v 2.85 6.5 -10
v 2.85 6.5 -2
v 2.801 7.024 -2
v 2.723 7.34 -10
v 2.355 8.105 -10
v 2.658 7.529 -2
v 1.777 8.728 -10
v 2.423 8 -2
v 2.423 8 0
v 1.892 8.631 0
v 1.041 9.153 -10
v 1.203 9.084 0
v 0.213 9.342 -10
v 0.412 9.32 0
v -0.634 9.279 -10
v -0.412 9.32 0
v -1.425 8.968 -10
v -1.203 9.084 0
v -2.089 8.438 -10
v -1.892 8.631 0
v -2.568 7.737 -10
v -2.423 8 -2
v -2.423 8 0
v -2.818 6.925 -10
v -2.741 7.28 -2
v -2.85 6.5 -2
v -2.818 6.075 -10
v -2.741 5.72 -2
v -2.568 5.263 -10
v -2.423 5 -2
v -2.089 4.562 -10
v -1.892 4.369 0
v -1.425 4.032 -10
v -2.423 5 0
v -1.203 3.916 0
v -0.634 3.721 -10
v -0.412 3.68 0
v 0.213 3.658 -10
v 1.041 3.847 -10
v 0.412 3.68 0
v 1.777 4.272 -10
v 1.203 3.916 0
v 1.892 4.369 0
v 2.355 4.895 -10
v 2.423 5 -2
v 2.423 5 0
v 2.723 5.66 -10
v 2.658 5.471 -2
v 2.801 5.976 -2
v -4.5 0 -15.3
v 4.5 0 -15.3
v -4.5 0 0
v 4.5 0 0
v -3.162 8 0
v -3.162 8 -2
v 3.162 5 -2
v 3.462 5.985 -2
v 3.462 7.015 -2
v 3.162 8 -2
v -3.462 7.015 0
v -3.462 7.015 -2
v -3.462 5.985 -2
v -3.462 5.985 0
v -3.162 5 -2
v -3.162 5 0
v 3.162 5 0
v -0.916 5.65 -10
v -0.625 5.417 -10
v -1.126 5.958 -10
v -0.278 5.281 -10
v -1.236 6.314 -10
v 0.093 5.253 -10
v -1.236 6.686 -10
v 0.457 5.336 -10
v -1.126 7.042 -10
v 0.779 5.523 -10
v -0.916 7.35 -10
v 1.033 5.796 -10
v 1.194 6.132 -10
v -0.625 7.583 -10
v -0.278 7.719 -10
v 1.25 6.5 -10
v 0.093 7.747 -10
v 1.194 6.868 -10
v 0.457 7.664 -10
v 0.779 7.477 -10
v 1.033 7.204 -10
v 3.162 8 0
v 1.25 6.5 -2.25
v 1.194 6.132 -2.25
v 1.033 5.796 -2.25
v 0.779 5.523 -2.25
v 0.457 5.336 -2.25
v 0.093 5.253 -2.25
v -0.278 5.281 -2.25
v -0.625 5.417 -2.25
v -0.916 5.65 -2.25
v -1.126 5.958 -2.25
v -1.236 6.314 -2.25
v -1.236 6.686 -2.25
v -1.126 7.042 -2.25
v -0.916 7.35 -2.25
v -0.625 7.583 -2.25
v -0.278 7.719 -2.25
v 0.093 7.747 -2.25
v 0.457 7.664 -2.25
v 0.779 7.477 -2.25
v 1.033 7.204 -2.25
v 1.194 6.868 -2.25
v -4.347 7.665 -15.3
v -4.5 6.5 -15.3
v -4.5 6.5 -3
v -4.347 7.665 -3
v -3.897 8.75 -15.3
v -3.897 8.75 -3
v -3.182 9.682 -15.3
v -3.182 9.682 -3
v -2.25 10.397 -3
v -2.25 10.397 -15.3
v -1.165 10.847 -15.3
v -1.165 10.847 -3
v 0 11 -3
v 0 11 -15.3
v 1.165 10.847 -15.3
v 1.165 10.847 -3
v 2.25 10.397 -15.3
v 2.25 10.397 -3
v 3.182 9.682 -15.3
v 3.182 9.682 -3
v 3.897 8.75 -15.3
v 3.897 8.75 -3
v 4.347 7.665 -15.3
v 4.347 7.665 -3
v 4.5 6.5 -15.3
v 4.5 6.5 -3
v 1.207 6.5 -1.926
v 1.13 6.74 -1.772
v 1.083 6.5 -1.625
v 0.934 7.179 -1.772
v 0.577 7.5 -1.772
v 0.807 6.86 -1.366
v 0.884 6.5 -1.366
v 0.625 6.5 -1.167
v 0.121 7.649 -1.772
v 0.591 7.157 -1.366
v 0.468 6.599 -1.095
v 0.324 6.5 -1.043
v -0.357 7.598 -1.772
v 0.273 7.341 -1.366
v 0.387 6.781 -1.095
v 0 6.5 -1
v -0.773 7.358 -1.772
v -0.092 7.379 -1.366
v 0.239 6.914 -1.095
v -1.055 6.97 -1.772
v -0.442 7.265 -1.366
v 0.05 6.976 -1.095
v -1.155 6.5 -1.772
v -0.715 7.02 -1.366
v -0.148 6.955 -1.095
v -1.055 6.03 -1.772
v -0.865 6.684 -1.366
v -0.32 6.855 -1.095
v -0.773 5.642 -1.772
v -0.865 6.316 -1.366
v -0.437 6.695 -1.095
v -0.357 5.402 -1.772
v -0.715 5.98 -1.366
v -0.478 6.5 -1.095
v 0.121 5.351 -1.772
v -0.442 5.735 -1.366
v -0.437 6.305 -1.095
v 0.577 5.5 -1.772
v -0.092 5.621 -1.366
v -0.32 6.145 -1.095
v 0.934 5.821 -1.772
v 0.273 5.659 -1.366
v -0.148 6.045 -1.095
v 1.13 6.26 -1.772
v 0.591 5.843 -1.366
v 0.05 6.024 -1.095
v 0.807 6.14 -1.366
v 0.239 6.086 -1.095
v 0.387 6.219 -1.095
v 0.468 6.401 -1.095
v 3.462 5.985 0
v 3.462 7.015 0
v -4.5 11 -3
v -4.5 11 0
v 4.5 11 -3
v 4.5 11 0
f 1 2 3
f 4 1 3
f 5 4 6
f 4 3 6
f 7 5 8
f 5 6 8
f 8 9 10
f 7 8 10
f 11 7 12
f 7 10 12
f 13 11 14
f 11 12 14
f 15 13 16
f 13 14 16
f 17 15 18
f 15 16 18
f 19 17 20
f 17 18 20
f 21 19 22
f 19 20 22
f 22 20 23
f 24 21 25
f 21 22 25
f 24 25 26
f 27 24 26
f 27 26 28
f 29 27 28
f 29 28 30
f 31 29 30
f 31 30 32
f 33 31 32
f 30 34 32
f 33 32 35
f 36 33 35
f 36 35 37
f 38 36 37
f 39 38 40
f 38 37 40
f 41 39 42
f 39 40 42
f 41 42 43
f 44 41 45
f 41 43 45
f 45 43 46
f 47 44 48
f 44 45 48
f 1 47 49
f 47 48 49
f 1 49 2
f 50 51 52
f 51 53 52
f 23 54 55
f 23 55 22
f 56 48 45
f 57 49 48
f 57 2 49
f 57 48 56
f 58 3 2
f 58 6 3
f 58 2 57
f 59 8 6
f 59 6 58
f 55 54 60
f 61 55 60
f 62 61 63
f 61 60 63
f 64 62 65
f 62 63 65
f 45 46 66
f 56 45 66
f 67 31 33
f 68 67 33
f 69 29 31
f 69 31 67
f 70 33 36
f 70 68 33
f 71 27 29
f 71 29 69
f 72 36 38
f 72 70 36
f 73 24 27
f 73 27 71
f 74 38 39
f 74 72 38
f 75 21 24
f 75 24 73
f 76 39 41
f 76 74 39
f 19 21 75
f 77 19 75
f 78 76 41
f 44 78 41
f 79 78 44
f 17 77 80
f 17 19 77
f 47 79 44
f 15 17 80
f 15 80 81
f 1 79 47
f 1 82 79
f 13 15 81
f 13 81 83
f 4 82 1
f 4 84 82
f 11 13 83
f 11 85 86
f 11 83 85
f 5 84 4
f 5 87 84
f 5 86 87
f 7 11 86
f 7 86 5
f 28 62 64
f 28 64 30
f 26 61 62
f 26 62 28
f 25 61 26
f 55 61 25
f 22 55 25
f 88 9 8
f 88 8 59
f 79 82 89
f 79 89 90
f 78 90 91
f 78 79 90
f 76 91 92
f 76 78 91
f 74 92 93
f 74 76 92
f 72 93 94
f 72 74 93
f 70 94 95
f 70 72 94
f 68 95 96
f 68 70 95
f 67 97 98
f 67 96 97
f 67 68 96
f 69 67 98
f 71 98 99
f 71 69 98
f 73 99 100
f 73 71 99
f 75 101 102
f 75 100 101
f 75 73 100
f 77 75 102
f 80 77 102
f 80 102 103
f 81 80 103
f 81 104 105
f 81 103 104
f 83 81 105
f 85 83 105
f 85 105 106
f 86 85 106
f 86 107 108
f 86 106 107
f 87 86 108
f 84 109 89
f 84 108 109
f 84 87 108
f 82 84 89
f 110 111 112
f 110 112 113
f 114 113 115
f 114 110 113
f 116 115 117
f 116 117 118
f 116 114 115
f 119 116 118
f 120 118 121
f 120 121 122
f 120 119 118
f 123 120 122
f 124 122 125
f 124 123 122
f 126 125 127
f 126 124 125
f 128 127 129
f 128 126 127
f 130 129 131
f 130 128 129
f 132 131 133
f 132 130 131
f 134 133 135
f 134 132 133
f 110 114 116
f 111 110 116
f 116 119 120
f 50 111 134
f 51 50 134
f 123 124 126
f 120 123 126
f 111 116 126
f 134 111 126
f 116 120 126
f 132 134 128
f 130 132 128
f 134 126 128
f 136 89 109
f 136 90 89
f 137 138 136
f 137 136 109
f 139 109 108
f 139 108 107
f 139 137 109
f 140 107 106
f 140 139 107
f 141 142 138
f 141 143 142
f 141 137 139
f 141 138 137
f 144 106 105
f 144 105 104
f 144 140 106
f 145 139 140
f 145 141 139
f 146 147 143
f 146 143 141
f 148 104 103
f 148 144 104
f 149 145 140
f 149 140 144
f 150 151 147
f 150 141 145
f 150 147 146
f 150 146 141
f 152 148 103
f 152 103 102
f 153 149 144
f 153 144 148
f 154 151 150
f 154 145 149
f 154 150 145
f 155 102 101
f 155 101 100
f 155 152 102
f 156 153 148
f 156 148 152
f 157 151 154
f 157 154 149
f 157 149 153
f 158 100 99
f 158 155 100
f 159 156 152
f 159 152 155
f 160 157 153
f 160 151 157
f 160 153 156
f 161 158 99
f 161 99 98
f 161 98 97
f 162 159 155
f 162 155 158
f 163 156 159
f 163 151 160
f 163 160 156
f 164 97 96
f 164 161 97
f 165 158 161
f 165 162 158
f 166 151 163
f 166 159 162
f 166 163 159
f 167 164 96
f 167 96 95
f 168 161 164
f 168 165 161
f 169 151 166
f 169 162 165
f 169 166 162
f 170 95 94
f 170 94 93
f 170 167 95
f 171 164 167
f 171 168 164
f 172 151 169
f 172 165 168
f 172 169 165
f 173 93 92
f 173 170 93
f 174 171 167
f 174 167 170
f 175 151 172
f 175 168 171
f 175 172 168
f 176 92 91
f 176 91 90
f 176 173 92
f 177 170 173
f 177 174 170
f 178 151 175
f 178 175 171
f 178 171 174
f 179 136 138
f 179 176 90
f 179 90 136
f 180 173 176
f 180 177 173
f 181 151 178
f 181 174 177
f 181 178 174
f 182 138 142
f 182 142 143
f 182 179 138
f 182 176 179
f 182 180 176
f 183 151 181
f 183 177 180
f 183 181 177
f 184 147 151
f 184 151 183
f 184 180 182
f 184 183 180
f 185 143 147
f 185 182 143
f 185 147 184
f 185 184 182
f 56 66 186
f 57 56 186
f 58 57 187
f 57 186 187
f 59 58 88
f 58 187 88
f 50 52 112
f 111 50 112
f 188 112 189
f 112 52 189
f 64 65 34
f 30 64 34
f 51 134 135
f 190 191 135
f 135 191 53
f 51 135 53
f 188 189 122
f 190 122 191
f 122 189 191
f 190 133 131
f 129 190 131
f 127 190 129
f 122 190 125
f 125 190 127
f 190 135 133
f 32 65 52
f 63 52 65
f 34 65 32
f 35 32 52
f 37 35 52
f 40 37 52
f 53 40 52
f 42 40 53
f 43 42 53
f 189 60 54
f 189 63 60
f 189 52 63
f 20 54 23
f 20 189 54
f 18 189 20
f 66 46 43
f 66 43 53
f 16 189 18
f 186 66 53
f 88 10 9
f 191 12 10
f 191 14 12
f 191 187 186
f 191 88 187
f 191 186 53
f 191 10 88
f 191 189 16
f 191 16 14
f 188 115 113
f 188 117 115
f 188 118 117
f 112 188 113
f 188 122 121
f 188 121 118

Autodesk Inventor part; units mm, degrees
ref_plane "YZ Plane" through (0, 0, 0) normal (1, 0, 0) x (0, 1, 0)
ref_plane "XZ Plane" through (0, 0, 0) normal (0, 1, 0) x (-1, 0, 0)
ref_plane "XY Plane" through (0, 0, 0) normal (0, 0, 1) x (1, 0, 0)
sketch "Sketch1" plane through (0, 0, 0) normal (0, 0, 1) x (1, 0, 0)
  line L0 (-4.5, 11) -> (4.5, 11)
  line L1 (4.5, 11) -> (4.5, 0)
  line L2 (4.5, 0) -> (-4.5, 0)
  line L3 (-4.5, 0) -> (-4.5, 11)
  point P0 (0, 0)
  dimension "d0" = 9
  dimension "d1" = 0
  dimension "d2" = 11
  dimension "d3" = 4.5
extrude "Extrusion1" add sketch "Sketch1" against normal blind 15.3
sketch "Sketch2" plane through (0, 0, 0) normal (0, 0, 1) x (1, 0, 0)
  line L0 (4.5, 0) -> (-4.5, 0) projected
  circle A0 centre (0, 6.5) radius 2.85
  point P0 (0, 0)
  dimension "d6" = 5.7
  dimension "d7" = 6.5
extrude "Extrusion2" cut sketch "Sketch2" against normal blind 10
sketch "Sketch4" plane through (0, 0, 0) normal (0, 0, 1) x (1, 0, 0)
  circle A0 centre (0, 6.5) radius 2.85 projected
  line L0 (4.5, 11) -> (4.5, 0) projected
  arc A1 (-3.1623, 8) -> (-3.1623, 5) centre (0, 6.5) ccw
  arc A2 (3.1623, 5) -> (3.1623, 8) centre (0, 6.5) ccw
  line L1 (-3.1623, 8) -> (3.1623, 8)
  line L2 (-3.1623, 5) -> (3.1623, 5)
  point P0 (0, 0)
  dimension "d17" = 3.5
  dimension "d18" = 3
  dimension "d19" = 1.5
extrude "Extrusion4" cut sketch "Sketch4" against normal blind 2 contours A0 L2 L1 | A0 L1 A2 L2 | A0 L2 A1 L1
sketch "Sketch3" plane through (0, 6.5, -10) normal (0, 0, 1) x (1, 0, 0)
  circle A0 centre (0, 0) radius 2.85 projected
  circle A1 centre (0, 0) radius 1.25
  point P0 (0, -6.5)
  dimension "d10" = 2.5
extrude "Extrusion3" add sketch "Sketch3" along normal blind 9 contours A1
fillet "Fillet1" radius 1.25 1 edges at (-1.25, 6.5, -1)
sketch "Sketch5" plane through (0, 0, -15.3) normal (0, 0, -1) x (-1, 0, 0)
  line L0 (4.5, 11) -> (-4.5, 11) projected
  line L1 (-4.5, 11) -> (-4.5, 0) projected
  line L2 (-4.5, 0) -> (4.5, 0) projected
  line L3 (4.5, 0) -> (4.5, 11) projected
  arc A0 (4.5, 6.5) -> (-4.5, 6.5) centre (0, 6.5) ccw
  point P0 (0, 0)
  dimension "d22" = 0
  dimension "d23" = 9
extrude "Extrusion5" cut sketch "Sketch5" against normal blind 12.3 contours L3 A0 L0 | A0 L1 L0
properties part number "jack" material "PET Plastic"
